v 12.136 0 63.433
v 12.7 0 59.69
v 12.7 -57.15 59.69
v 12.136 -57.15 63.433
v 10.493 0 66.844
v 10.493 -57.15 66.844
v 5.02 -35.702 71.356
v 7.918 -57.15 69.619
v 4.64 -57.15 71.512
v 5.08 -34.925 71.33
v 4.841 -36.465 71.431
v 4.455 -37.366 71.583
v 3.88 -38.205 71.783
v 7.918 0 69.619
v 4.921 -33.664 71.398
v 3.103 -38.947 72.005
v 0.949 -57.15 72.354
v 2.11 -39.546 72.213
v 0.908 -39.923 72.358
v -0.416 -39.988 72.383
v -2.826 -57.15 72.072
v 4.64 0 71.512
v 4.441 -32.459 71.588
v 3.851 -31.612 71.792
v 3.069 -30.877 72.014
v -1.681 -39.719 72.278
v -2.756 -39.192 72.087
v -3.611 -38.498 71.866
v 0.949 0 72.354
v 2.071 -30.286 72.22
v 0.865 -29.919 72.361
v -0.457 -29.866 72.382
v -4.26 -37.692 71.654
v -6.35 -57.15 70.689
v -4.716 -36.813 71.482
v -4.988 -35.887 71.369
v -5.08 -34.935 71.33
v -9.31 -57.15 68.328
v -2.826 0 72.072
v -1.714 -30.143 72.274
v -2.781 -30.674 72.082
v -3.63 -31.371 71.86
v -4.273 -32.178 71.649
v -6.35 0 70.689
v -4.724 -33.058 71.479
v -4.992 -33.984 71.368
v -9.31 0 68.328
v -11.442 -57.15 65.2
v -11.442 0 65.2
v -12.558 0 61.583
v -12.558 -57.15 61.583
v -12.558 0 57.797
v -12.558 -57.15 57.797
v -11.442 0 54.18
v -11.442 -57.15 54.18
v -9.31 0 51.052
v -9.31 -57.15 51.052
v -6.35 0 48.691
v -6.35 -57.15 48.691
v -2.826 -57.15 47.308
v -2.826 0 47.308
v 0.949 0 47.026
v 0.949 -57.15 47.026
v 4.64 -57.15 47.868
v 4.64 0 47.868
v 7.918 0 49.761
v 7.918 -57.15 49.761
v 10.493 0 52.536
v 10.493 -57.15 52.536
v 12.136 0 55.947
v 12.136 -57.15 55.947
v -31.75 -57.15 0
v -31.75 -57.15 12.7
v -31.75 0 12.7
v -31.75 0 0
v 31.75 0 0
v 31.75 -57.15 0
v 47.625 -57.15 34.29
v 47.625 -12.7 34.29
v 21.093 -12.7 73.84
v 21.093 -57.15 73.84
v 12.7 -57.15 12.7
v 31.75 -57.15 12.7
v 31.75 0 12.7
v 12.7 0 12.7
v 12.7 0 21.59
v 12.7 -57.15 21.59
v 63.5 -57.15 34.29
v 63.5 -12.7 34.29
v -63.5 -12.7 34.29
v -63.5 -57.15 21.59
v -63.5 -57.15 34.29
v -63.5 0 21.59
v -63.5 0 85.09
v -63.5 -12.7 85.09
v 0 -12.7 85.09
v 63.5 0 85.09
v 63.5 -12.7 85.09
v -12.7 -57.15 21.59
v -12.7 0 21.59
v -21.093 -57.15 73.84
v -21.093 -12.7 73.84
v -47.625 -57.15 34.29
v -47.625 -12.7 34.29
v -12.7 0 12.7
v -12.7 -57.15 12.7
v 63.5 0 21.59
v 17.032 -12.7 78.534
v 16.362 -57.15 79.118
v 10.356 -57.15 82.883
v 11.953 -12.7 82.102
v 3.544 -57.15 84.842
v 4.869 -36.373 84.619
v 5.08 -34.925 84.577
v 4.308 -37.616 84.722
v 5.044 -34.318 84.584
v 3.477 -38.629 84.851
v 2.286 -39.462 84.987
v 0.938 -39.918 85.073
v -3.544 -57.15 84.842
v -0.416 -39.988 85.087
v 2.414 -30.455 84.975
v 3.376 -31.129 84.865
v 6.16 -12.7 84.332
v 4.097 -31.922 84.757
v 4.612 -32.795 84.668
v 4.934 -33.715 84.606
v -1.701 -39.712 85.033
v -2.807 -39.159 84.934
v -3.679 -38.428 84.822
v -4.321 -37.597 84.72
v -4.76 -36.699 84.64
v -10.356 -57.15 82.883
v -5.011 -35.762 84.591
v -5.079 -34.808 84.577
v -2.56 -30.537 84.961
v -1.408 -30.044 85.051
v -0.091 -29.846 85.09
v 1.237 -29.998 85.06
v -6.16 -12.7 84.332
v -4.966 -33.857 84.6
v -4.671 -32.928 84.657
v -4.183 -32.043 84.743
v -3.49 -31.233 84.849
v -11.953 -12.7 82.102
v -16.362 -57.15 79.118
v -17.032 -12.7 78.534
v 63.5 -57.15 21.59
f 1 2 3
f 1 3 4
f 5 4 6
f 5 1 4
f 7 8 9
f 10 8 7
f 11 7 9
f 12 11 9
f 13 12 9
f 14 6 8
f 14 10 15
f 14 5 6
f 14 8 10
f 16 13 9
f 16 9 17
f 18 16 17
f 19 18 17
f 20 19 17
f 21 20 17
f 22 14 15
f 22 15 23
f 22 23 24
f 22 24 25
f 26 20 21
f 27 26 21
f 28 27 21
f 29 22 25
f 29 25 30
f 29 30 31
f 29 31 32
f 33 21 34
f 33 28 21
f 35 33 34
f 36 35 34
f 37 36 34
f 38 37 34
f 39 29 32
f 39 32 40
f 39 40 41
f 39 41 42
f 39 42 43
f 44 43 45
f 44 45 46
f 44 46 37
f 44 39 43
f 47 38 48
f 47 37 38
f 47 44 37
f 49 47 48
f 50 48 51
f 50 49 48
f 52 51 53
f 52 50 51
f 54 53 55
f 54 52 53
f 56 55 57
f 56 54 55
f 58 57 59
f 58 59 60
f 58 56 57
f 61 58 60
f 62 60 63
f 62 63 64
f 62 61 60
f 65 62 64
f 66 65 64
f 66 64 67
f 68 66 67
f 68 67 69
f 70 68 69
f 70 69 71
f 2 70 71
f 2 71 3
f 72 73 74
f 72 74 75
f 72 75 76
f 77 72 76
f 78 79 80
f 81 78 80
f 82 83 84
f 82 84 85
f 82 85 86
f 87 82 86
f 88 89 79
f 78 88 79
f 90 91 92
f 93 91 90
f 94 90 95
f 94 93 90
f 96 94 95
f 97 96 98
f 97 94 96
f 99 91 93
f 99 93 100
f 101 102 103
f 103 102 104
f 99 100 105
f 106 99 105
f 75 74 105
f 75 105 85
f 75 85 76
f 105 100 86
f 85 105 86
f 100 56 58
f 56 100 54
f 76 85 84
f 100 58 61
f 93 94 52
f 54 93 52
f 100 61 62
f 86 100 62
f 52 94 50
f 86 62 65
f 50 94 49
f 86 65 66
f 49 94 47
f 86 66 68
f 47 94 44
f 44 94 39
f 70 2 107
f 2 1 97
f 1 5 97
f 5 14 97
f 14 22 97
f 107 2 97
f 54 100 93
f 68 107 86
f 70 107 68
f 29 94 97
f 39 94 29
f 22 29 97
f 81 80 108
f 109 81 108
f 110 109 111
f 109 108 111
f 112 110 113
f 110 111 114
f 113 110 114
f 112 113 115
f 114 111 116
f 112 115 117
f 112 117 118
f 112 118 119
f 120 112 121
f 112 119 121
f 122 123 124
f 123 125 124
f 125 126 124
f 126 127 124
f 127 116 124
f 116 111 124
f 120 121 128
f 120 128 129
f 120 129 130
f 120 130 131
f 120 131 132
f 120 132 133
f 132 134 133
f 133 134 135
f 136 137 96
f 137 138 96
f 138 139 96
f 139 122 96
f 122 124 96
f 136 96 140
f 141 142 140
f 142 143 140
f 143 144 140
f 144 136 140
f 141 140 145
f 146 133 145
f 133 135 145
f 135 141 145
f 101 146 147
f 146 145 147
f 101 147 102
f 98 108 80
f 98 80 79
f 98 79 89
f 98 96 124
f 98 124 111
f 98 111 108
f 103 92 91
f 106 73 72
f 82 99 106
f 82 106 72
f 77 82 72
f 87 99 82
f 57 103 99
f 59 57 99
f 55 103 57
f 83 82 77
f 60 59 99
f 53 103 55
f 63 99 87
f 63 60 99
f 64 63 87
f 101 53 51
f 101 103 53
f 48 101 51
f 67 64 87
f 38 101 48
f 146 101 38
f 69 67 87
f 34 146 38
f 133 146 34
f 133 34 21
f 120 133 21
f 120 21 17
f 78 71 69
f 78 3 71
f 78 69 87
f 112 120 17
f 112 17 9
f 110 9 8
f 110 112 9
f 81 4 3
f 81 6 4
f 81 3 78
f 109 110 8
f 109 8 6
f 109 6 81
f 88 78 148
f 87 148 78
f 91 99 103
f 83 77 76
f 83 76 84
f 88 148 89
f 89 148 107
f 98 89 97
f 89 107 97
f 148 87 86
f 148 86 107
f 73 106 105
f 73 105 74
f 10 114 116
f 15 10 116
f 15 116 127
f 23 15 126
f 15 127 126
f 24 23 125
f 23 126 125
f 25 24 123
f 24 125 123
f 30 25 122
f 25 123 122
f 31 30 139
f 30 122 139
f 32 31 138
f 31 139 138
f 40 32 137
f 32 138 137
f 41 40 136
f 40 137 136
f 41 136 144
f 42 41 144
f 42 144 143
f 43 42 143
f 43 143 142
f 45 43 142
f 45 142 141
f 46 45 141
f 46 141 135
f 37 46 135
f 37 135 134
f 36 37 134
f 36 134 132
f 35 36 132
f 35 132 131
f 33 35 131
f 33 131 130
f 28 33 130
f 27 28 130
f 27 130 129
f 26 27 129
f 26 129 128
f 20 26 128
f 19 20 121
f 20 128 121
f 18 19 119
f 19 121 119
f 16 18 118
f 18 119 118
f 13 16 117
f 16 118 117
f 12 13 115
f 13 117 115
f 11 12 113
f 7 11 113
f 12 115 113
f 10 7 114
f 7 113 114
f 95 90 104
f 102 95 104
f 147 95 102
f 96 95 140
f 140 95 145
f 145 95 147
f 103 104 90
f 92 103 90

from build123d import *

# Parameters (mm, degrees)
F0_R     = 12.7
F2_DEPTH = 57.15
F1_W     = 127
F1_H     = 50.8
F1_R     = 12.7
F3_DEPTH = 12.7
F4_R     = 5.08
F5_DEPTH = 25.4


with BuildPart() as f2:
    # F0 (on Front) → F2 (new body)
    with BuildSketch(Plane.XZ):
        with BuildLine():
            Line((-31.75, 0), (0, 0))
            Line((0, 0), (31.75, 0))
            Line((31.75, 0), (31.75, 12.7))
            Line((31.75, 12.7), (12.7, 12.7))
            Line((12.7, 12.7), (12.7, 21.59))
            Line((12.7, 21.59), (63.5, 21.59))
            Line((63.5, 21.59), (63.5, 34.29))
            Line((63.5, 34.29), (47.625, 34.29))
            Line((47.625, 34.29), (21.093426, 73.840173))
            ThreePointArc((21.093426, 73.840173), (0, 85.09), (-21.093426, 73.840173))
            Line((-21.093426, 73.840173), (-47.625, 34.29))
            Line((-47.625, 34.29), (-63.5, 34.29))
            Line((-63.5, 34.29), (-63.5, 21.59))
            Line((-63.5, 21.59), (-12.7, 21.59))
            Line((-12.7, 21.59), (-12.7, 12.7))
            Line((-12.7, 12.7), (-31.75, 12.7))
            Line((-31.75, 12.7), (-31.75, 0))
        make_face()
        with Locations((0, 59.69)):
            Circle(F0_R, mode=Mode.SUBTRACT)
    extrude(amount=F2_DEPTH)

    # F1 (on Front) → F3 (join)
    with BuildSketch(Plane.XZ):
        with Locations((0, 59.69)):
            Rectangle(F1_W, F1_H)
        with Locations((0, 59.69)):
            Circle(F1_R, mode=Mode.SUBTRACT)
    extrude(amount=F3_DEPTH)

    # F4 (on face) → F5 (cut)
    with BuildSketch(Plane.XY.offset(85.09)):
        with Locations((0, -34.925)):
            Circle(F4_R)
    extrude(amount=-F5_DEPTH, mode=Mode.SUBTRACT)


solid = f2.part
